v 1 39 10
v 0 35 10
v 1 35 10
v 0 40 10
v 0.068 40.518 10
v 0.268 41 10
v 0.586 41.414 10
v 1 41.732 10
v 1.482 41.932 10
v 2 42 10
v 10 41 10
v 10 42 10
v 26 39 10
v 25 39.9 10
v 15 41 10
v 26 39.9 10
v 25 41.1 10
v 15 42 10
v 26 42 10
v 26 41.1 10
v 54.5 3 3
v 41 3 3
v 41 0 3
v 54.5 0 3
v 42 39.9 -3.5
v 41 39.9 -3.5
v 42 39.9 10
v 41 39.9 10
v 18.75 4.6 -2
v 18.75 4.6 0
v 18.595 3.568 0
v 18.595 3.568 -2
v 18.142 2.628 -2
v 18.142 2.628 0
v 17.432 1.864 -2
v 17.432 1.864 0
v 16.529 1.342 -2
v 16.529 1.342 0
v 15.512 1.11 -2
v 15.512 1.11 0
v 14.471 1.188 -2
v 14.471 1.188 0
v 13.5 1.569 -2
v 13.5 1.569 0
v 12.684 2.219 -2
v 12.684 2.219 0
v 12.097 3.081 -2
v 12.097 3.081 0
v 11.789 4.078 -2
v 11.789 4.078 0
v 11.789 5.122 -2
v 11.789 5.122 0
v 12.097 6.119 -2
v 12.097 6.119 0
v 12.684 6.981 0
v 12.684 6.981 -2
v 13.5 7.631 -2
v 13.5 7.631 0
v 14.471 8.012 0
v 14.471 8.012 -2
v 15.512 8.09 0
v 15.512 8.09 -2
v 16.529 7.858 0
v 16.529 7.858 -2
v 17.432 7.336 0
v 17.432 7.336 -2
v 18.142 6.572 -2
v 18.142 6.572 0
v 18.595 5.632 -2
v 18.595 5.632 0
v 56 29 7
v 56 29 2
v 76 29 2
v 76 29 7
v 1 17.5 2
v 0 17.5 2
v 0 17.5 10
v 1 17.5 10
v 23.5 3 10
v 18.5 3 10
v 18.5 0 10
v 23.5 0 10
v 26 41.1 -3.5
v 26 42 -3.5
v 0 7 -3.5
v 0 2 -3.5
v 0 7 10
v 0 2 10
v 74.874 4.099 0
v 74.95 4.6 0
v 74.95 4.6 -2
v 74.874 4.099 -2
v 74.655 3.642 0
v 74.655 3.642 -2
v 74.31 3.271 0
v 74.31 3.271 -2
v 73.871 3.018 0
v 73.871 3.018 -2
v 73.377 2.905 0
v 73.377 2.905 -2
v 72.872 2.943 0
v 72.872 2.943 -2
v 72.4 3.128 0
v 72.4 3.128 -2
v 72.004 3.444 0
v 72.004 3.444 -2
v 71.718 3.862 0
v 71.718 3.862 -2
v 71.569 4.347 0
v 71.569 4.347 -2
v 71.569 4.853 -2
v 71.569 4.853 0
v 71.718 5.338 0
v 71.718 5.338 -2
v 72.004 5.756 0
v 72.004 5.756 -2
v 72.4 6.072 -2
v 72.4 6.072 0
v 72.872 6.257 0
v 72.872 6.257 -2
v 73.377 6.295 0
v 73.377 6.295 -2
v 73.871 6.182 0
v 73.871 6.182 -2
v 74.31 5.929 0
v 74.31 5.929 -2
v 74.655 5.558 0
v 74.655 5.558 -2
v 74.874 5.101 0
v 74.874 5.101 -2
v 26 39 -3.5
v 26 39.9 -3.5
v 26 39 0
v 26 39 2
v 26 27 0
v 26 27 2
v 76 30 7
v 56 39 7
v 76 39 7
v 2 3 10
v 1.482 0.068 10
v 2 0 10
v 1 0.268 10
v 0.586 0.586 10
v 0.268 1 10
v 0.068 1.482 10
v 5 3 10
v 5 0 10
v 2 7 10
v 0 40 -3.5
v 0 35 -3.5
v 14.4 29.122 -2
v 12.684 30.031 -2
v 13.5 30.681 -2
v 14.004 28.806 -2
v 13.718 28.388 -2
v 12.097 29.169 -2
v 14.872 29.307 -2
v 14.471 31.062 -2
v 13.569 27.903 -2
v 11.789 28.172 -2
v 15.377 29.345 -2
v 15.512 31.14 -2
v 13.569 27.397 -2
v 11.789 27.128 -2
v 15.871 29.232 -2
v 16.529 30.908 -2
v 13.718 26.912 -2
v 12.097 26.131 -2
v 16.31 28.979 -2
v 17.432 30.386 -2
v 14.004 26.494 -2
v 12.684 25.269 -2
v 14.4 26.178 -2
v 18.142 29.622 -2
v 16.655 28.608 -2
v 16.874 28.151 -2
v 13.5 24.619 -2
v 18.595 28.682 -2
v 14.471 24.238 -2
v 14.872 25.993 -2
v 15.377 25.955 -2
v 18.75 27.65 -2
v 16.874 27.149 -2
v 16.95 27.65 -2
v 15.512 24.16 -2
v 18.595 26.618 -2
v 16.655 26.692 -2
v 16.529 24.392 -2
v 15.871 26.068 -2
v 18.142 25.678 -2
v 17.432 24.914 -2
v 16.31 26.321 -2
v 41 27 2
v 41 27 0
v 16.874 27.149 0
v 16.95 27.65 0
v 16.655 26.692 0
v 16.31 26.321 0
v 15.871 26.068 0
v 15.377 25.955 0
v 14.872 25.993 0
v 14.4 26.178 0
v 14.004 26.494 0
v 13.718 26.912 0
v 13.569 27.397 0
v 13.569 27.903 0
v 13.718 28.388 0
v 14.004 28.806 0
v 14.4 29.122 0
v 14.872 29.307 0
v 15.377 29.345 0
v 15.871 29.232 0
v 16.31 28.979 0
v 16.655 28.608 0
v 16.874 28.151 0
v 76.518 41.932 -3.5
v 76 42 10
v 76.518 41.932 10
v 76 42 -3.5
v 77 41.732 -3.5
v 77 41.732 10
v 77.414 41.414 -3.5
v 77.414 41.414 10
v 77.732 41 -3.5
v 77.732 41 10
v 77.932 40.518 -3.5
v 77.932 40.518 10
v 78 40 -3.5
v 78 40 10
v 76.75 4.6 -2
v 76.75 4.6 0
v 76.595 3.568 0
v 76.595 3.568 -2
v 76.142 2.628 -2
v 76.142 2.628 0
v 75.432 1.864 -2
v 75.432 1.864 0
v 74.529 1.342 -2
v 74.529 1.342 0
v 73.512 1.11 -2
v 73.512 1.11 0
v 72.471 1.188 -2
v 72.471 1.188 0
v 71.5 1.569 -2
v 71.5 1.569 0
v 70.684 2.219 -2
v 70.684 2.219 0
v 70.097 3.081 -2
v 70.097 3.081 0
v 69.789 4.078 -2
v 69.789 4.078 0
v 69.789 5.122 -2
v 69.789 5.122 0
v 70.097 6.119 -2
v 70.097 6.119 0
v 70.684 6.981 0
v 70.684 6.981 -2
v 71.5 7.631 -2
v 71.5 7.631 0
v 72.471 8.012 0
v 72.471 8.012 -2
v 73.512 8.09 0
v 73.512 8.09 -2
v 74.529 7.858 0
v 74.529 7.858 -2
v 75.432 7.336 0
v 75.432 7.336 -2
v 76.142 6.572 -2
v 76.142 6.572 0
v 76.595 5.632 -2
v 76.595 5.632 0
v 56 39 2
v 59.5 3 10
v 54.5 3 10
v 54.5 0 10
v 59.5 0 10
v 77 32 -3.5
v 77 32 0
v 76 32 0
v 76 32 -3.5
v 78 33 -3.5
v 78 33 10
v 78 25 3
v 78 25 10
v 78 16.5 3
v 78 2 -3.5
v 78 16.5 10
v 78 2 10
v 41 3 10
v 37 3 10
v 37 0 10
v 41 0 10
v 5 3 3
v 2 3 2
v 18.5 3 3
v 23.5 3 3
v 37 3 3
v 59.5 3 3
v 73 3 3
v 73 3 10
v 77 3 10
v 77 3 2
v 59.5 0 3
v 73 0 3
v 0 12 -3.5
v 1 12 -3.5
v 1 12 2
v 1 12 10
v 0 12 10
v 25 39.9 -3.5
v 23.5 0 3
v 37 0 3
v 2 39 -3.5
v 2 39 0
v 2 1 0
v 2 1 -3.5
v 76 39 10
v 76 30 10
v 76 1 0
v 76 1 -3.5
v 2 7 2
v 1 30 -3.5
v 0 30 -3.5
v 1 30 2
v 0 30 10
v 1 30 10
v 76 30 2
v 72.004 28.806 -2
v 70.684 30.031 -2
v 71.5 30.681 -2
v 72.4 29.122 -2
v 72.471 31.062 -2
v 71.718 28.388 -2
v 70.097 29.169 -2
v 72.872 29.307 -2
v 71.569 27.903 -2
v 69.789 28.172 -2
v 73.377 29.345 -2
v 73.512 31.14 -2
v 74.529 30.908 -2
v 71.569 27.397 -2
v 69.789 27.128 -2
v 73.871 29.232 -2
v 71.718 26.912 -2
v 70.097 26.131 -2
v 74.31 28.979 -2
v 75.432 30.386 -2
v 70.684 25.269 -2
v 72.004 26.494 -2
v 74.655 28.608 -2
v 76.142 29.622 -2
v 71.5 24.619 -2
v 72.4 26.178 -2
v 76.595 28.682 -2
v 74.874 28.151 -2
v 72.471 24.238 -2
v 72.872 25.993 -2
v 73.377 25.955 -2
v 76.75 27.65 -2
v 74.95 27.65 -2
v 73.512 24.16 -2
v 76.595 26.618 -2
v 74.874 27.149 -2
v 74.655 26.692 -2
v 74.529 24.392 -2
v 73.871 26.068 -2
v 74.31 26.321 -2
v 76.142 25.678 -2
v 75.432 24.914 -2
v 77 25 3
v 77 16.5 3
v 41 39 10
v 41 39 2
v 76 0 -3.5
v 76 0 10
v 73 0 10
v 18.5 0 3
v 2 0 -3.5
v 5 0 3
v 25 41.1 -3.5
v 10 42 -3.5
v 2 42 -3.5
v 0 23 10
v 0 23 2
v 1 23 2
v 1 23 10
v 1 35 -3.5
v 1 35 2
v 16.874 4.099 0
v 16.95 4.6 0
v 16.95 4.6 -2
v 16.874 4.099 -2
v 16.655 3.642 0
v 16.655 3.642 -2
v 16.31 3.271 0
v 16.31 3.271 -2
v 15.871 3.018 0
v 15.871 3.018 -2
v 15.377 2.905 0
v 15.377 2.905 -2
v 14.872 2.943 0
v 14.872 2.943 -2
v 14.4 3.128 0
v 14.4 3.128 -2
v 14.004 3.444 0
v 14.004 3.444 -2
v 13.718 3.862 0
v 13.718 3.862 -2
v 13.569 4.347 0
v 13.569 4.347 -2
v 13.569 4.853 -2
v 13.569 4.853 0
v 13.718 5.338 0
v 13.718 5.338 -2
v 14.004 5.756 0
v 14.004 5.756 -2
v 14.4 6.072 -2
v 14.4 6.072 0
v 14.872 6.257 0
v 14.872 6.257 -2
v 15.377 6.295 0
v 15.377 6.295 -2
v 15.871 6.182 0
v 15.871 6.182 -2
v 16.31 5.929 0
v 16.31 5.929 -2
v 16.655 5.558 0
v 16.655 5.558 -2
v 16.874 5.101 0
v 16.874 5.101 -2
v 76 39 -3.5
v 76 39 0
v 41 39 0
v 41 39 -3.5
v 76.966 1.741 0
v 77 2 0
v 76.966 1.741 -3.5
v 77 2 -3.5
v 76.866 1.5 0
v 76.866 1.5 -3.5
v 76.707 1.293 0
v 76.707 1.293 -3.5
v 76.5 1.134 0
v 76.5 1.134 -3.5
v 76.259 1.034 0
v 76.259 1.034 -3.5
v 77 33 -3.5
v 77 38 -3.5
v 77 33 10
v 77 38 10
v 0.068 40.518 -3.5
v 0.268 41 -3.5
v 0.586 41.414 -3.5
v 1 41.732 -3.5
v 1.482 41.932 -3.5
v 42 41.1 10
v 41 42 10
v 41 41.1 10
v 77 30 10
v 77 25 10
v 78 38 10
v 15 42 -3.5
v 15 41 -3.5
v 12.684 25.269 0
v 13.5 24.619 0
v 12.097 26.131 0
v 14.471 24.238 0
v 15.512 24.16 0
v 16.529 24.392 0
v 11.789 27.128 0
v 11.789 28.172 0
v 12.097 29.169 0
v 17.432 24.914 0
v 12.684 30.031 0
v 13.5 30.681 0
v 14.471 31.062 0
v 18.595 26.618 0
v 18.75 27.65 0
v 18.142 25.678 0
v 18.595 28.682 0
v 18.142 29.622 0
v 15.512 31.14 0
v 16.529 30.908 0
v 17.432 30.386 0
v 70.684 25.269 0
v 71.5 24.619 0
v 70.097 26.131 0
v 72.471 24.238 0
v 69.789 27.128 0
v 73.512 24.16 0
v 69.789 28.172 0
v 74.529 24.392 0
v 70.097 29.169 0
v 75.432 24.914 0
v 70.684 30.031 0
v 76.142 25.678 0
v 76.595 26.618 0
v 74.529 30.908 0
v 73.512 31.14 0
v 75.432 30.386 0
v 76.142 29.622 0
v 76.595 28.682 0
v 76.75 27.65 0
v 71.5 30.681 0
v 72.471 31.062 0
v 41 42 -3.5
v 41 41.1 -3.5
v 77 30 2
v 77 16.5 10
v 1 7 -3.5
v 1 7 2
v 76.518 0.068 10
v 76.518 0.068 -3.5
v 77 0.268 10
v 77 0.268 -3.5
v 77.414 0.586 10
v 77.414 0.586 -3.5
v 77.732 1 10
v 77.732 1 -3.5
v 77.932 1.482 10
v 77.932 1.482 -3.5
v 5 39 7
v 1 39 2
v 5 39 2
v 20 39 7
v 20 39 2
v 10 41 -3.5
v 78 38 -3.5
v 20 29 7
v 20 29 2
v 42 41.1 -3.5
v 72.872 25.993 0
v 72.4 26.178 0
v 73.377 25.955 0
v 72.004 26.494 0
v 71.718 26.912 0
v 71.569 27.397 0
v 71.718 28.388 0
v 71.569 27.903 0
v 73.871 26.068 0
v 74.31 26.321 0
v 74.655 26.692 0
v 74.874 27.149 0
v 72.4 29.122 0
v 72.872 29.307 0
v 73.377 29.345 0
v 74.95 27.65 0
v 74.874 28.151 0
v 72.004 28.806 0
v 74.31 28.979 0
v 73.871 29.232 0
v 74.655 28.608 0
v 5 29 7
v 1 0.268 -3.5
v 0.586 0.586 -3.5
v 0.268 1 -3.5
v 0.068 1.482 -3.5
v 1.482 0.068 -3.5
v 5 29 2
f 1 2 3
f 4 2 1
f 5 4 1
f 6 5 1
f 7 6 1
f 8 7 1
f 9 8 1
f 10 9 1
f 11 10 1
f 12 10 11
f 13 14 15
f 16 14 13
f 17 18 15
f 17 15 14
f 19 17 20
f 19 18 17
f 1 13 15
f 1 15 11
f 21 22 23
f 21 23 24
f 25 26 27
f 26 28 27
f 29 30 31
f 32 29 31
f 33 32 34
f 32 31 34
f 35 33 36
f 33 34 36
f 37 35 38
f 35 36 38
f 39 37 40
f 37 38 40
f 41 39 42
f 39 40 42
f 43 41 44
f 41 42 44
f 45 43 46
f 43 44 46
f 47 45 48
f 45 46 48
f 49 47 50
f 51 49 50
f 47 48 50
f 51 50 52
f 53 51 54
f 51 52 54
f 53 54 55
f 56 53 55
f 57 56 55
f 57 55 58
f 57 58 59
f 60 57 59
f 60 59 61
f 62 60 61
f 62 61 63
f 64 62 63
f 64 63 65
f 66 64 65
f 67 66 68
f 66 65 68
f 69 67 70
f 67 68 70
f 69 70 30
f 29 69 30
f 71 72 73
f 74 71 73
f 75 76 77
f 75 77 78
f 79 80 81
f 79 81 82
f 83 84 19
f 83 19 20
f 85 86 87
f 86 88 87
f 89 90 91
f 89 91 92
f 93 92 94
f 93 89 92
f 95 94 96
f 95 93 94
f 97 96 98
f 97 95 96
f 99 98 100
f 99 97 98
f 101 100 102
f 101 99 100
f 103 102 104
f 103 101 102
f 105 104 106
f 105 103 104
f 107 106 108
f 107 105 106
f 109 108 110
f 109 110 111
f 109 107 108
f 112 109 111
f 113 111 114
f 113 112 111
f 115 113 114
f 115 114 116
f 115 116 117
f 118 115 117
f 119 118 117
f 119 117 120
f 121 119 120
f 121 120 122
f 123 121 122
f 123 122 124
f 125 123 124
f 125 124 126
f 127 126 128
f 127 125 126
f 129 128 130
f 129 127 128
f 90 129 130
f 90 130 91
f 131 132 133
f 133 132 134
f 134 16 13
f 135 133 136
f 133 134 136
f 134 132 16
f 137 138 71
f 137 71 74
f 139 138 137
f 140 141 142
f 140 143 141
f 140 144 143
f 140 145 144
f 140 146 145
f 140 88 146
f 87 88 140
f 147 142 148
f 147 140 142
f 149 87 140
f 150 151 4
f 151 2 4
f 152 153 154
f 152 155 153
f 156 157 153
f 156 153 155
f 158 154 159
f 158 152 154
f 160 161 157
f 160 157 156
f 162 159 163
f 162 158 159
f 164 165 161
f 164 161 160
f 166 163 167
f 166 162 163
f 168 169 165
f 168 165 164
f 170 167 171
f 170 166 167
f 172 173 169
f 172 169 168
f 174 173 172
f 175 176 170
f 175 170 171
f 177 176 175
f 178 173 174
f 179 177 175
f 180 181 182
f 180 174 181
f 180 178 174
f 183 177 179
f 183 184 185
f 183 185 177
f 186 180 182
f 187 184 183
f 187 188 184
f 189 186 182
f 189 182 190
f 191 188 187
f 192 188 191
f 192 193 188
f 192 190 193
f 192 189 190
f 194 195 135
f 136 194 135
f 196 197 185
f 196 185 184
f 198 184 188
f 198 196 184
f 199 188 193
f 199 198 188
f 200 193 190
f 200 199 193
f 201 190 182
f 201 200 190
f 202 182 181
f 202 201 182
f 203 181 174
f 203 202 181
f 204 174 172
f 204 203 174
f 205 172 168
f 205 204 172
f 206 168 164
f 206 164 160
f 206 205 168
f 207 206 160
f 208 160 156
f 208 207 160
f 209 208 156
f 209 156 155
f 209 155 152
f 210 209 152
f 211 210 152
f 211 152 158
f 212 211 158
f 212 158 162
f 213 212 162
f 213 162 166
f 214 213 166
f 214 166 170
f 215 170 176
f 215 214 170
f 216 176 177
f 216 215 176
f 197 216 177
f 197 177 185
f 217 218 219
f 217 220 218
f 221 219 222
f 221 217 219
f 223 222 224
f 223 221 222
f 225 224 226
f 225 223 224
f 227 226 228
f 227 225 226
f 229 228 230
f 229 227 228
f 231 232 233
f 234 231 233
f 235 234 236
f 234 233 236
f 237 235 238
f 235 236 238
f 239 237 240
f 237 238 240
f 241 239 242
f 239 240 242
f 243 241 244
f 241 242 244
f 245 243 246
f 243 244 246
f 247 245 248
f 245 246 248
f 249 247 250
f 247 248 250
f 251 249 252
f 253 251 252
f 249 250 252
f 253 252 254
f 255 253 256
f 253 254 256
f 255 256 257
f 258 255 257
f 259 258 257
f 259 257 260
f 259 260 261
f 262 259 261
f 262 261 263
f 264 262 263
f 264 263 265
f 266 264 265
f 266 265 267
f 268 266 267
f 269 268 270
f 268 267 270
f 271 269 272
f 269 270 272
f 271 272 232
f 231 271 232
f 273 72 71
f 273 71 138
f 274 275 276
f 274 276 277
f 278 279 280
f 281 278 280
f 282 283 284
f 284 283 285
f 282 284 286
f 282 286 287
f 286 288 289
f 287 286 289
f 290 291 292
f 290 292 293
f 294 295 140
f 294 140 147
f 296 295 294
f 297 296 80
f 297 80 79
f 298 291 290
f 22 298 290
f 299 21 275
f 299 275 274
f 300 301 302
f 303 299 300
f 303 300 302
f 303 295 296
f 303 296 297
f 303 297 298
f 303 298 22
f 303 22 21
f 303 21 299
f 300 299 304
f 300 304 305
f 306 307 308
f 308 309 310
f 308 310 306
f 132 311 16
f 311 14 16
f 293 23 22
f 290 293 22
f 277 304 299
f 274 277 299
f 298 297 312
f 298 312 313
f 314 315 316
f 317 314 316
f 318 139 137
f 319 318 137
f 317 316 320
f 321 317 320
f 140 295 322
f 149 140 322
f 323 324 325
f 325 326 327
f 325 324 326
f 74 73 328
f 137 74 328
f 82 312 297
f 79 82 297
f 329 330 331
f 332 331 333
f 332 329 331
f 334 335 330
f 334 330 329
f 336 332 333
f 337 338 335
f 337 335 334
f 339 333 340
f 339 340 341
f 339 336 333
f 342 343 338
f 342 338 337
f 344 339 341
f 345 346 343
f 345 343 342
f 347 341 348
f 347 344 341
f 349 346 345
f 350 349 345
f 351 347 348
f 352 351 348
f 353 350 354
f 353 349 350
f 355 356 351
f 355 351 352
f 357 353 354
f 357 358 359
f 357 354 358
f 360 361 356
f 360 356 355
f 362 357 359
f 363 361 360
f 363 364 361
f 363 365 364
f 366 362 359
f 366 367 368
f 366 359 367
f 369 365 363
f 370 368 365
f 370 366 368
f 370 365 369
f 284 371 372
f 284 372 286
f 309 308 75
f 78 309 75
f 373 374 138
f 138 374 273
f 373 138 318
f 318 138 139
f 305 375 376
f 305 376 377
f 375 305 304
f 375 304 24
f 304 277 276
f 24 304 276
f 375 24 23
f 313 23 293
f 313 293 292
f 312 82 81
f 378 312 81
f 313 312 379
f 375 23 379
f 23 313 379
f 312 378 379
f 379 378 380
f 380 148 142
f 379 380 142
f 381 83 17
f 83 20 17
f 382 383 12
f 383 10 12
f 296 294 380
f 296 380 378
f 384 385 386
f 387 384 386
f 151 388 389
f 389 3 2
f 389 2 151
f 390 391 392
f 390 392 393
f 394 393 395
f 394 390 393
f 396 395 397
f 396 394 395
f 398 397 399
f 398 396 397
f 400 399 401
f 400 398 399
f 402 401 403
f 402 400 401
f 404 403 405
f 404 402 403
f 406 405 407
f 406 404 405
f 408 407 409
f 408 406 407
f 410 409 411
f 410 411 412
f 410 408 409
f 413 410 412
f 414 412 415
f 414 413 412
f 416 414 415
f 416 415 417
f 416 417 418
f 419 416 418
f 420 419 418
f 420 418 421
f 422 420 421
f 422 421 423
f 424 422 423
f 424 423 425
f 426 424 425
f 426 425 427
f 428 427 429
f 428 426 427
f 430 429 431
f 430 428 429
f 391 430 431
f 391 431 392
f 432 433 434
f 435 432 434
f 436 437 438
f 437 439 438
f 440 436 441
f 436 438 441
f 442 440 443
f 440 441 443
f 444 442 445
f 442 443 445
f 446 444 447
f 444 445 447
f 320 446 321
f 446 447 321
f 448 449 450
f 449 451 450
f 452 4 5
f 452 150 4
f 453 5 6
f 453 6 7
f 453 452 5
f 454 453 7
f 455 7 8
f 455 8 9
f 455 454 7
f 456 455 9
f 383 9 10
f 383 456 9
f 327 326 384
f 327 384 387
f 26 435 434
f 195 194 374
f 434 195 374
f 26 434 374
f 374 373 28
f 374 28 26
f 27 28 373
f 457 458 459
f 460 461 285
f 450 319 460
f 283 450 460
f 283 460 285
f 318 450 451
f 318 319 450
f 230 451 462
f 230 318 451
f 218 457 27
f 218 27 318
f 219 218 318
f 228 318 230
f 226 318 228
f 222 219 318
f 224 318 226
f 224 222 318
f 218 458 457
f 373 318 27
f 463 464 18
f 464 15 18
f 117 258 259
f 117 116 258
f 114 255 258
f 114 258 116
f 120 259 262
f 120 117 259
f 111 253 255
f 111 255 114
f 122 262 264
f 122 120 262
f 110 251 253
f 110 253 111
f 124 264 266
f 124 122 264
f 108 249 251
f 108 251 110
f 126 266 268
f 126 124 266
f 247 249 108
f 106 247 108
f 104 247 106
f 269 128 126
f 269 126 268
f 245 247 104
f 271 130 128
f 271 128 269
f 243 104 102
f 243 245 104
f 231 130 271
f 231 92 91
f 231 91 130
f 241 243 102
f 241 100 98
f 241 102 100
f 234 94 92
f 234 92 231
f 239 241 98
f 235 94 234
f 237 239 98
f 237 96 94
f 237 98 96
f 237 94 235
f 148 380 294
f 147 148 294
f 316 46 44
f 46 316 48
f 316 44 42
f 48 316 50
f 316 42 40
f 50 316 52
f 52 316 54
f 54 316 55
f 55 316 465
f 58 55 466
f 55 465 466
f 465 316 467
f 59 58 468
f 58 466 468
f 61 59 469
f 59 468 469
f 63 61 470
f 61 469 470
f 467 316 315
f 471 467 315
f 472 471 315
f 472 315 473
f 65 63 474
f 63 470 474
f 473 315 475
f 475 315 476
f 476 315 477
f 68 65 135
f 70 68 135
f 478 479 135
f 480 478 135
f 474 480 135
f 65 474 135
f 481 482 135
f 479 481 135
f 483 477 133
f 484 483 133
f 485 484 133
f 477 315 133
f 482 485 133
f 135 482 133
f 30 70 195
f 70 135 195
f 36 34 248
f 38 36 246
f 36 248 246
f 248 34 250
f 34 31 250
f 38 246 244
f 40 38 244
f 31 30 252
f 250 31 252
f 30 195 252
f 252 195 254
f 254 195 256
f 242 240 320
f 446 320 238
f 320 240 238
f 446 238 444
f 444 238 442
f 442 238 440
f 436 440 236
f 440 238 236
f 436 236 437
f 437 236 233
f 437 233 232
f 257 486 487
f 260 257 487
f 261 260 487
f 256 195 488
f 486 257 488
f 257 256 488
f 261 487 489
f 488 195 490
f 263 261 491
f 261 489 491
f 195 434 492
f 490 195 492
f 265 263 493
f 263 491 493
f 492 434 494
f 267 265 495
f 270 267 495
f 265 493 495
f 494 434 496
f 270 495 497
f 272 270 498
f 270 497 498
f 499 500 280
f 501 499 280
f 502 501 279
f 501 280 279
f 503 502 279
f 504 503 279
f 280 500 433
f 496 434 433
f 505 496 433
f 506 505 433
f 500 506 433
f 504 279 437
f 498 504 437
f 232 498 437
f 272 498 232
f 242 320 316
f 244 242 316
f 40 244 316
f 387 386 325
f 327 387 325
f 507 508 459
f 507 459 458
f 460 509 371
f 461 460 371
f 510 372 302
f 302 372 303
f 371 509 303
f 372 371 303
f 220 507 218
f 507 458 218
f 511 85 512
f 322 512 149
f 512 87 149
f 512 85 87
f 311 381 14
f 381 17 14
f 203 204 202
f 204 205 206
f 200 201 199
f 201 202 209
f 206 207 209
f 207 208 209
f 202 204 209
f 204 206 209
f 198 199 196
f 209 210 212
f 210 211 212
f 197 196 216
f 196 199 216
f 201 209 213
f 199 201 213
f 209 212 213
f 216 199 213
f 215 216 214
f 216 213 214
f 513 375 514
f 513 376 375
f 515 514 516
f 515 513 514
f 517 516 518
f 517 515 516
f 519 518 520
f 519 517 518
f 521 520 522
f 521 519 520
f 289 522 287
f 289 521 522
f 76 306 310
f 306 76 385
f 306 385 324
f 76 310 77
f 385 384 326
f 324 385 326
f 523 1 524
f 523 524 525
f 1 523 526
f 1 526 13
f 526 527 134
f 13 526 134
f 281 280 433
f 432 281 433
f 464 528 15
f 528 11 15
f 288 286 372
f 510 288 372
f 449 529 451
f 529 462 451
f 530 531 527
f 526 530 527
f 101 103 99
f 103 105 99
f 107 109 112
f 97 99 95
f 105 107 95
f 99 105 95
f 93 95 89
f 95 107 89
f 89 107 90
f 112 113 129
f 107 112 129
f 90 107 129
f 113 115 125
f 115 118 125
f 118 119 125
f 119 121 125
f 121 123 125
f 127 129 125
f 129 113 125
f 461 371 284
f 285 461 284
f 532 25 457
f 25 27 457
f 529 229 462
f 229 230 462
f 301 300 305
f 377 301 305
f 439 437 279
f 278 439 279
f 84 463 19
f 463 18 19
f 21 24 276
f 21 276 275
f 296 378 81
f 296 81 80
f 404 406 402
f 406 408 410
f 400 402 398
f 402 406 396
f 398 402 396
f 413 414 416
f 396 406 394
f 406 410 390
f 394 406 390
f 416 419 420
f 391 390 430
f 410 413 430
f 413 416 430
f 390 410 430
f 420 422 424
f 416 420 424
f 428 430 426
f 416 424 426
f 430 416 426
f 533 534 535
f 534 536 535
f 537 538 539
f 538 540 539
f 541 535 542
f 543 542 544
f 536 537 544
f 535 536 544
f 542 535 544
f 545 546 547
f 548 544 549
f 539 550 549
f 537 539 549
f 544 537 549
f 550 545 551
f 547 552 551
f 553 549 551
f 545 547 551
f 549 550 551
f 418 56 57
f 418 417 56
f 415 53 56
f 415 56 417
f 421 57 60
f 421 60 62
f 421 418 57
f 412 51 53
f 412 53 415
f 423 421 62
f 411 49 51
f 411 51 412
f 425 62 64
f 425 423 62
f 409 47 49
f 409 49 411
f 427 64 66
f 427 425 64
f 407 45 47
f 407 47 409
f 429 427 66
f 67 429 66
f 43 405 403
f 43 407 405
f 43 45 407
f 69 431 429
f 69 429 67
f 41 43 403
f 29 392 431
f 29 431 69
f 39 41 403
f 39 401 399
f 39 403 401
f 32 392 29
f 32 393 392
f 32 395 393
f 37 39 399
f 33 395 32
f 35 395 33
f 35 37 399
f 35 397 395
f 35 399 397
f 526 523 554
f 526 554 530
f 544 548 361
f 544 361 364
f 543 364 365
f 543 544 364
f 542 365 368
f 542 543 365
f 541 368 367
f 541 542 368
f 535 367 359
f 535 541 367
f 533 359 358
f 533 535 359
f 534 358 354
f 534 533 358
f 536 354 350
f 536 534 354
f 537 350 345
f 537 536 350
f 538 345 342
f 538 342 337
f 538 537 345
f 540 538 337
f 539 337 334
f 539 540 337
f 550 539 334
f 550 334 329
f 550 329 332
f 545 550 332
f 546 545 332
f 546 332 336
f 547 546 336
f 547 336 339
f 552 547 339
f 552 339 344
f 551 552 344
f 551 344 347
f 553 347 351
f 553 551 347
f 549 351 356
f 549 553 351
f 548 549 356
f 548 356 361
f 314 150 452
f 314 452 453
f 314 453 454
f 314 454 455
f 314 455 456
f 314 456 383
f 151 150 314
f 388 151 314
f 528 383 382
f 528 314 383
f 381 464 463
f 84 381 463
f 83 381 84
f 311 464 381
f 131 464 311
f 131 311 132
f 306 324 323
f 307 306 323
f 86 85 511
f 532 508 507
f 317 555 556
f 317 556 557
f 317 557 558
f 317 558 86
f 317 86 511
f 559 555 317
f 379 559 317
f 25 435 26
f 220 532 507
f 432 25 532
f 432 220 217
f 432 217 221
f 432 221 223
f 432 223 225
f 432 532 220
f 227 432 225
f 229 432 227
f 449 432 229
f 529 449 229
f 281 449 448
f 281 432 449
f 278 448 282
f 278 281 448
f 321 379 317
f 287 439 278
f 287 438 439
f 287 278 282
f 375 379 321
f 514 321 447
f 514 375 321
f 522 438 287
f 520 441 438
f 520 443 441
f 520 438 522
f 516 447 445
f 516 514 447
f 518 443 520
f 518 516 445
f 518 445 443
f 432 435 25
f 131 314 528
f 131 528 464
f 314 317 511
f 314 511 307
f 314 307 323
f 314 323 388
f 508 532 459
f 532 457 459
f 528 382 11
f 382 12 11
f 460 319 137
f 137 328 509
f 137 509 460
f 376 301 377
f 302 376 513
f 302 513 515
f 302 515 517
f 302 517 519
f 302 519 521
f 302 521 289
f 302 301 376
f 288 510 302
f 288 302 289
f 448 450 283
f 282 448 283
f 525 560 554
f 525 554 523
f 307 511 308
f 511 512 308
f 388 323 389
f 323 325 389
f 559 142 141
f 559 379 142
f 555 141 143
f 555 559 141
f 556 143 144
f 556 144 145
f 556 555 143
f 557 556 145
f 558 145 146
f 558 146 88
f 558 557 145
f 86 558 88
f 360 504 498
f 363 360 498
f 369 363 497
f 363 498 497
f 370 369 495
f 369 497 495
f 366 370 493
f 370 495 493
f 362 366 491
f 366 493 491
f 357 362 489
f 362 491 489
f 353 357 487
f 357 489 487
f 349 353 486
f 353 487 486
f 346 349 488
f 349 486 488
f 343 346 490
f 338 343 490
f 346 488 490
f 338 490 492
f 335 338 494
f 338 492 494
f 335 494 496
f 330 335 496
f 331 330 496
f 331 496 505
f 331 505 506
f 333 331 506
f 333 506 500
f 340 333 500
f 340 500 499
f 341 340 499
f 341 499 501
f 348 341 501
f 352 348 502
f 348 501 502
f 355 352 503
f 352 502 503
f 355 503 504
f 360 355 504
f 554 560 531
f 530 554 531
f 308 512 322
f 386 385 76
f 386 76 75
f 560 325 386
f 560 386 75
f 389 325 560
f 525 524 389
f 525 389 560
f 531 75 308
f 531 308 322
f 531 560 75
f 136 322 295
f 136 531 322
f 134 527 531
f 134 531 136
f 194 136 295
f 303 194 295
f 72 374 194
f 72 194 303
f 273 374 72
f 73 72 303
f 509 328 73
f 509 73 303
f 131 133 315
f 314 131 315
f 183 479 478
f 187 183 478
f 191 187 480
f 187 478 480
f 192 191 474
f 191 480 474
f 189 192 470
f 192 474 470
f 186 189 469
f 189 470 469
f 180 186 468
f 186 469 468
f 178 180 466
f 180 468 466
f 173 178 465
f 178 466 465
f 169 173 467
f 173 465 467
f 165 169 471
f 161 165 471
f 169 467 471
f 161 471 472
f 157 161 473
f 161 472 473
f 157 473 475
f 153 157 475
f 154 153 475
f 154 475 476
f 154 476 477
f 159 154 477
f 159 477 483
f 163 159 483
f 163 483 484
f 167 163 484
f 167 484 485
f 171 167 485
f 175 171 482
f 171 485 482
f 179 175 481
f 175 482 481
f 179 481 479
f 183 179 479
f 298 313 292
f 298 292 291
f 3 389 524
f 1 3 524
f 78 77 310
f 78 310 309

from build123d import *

# Parameters (mm, degrees)
F1_DEPTH  = 2
F2_W      = 1
F2_H      = 7
F2_H_2    = 5.5
F2_W_2    = 5
F2_H_3    = 3
F2_W_3    = 4
F3_DEPTH  = 8
F4_W      = 68
F4_H      = 3
F4_W_2    = 1
F4_H_2    = 8.5
F5_DEPTH  = 1
F6_W      = 15
F6_H      = 10
F6_W_2    = 20
F7_DEPTH  = 5
F9_DEPTH  = 3.5
F10_R     = 3.5
F10_R_2   = 1.7
F11_DEPTH = 2
F13_R     = 2
F14_R     = 1


with BuildPart() as f1:
    # F0 (on Top) → F1 (new body)
    with BuildSketch(Plane.XY):
        Polygon((0, 7), (0, 0), (78, 0), (78, 33), (77, 33), (77, 38), (78, 38), (78, 42), (41, 42), (41, 41.1), (42, 41.1), (42, 39.9), (41, 39.9), (41, 27), (26, 27), (26, 39.9), (25, 39.9), (25, 41.1), (26, 41.1), (26, 42), (15, 42), (15, 41), (10, 41), (10, 42), (0, 42), (0, 35), (1, 35), (1, 30), (0, 30), (0, 12), (1, 12), (1, 7), align=None)
    extrude(amount=F1_DEPTH)

    # F2 (on face) → F3 (join)
    with BuildSketch(Plane.XY.offset(2)):
        Polygon((26, 42), (15, 42), (15, 41), (10, 41), (10, 42), (0, 42), (0, 35), (1, 35), (1, 39), (26, 39), (26, 39.9), (25, 39.9), (25, 41.1), (26, 41.1), align=None)
        with Locations((0.5, 26.5)):
            Rectangle(F2_W, F2_H)
        with Locations((0.5, 14.75)):
            Rectangle(F2_W, F2_H_2)
        Polygon((2, 7), (0, 7), (0, 0), (5, 0), (5, 3), (2, 3), align=None)
        Polygon((41, 39.9), (41, 39), (76, 39), (76, 30), (77, 30), (77, 25), (78, 25), (78, 33), (77, 33), (77, 38), (78, 38), (78, 42), (41, 42), (41, 41.1), (42, 41.1), (42, 39.9), align=None)
        Polygon((78, 0), (78, 16.5), (77, 16.5), (77, 3), (73, 3), (73, 0), align=None)
        with Locations((21, 1.5)):
            Rectangle(F2_W_2, F2_H_3)
        with Locations((39, 1.5)):
            Rectangle(F2_W_3, F2_H_3)
        with Locations((57, 1.5)):
            Rectangle(F2_W_2, F2_H_3)
    extrude(amount=F3_DEPTH)

    # F4 (on face) → F5 (join)
    with BuildSketch(Plane.XY.offset(2)):
        with Locations((39, 1.5)):
            Rectangle(F4_W, F4_H)
        with Locations((77.5, 20.75)):
            Rectangle(F4_W_2, F4_H_2)
    extrude(amount=F5_DEPTH)

    # F6 (on face) → F7 (join)
    with BuildSketch(Plane.XY.offset(2)):
        with Locations((12.5, 34)):
            Rectangle(F6_W, F6_H)
        with Locations((66, 34)):
            Rectangle(F6_W_2, F6_H)
    extrude(amount=F7_DEPTH)

    # F8 (on face) → F9 (join)
    with BuildSketch(Plane(origin=(0, 0, 0), x_dir=(1, 0, 0), z_dir=(0, 0, -1))):
        Polygon((78, 0), (0, 0), (0, -7), (1, -7), (1, -12), (0, -12), (0, -30), (1, -30), (1, -35), (0, -35), (0, -42), (10, -42), (10, -41), (15, -41), (15, -42), (26, -42), (26, -41.1), (25, -41.1), (25, -39.9), (26, -39.9), (26, -39), (2, -39), (2, -1), (77, -1), (77, -32), (76, -32), (76, -39), (41, -39), (41, -39.9), (42, -39.9), (42, -41.1), (41, -41.1), (41, -42), (78, -42), (78, -38), (77, -38), (77, -33), (78, -33), align=None)
    extrude(amount=F9_DEPTH)

    # F10 (on face) → F11 (join)
    with BuildSketch(Plane(origin=(0, 0, 0), x_dir=(1, 0, 0), z_dir=(0, 0, -1))):
        with Locations((73.25, -4.6)):
            Circle(F10_R)
        with Locations((73.25, -4.6)):
            Circle(F10_R_2, mode=Mode.SUBTRACT)
        with Locations((73.25, -27.65)):
            Circle(F10_R)
        with Locations((73.25, -27.65)):
            Circle(F10_R_2, mode=Mode.SUBTRACT)
        with Locations((15.25, -4.6)):
            Circle(F10_R)
        with Locations((15.25, -4.6)):
            Circle(F10_R_2, mode=Mode.SUBTRACT)
        with Locations((15.25, -27.65)):
            Circle(F10_R)
        with Locations((15.25, -27.65)):
            Circle(F10_R_2, mode=Mode.SUBTRACT)
    extrude(amount=F11_DEPTH)

    # F12: union 

    # F13
    f13_edges = [f1.edges().sort_by_distance(p)[0] for p in [
        (78, 0, 3.25),
        (78, 42, 3.25),
        (0, 0, 3.25),
        (0, 42, 3.25),
    ]]
    fillet(f13_edges, radius=F13_R)

    # F14
    f14_edges = [f1.edges().sort_by_distance(p)[0] for p in [
        (77, 1, -1.75),
    ]]
    fillet(f14_edges, radius=F14_R)


solid = f1.part
